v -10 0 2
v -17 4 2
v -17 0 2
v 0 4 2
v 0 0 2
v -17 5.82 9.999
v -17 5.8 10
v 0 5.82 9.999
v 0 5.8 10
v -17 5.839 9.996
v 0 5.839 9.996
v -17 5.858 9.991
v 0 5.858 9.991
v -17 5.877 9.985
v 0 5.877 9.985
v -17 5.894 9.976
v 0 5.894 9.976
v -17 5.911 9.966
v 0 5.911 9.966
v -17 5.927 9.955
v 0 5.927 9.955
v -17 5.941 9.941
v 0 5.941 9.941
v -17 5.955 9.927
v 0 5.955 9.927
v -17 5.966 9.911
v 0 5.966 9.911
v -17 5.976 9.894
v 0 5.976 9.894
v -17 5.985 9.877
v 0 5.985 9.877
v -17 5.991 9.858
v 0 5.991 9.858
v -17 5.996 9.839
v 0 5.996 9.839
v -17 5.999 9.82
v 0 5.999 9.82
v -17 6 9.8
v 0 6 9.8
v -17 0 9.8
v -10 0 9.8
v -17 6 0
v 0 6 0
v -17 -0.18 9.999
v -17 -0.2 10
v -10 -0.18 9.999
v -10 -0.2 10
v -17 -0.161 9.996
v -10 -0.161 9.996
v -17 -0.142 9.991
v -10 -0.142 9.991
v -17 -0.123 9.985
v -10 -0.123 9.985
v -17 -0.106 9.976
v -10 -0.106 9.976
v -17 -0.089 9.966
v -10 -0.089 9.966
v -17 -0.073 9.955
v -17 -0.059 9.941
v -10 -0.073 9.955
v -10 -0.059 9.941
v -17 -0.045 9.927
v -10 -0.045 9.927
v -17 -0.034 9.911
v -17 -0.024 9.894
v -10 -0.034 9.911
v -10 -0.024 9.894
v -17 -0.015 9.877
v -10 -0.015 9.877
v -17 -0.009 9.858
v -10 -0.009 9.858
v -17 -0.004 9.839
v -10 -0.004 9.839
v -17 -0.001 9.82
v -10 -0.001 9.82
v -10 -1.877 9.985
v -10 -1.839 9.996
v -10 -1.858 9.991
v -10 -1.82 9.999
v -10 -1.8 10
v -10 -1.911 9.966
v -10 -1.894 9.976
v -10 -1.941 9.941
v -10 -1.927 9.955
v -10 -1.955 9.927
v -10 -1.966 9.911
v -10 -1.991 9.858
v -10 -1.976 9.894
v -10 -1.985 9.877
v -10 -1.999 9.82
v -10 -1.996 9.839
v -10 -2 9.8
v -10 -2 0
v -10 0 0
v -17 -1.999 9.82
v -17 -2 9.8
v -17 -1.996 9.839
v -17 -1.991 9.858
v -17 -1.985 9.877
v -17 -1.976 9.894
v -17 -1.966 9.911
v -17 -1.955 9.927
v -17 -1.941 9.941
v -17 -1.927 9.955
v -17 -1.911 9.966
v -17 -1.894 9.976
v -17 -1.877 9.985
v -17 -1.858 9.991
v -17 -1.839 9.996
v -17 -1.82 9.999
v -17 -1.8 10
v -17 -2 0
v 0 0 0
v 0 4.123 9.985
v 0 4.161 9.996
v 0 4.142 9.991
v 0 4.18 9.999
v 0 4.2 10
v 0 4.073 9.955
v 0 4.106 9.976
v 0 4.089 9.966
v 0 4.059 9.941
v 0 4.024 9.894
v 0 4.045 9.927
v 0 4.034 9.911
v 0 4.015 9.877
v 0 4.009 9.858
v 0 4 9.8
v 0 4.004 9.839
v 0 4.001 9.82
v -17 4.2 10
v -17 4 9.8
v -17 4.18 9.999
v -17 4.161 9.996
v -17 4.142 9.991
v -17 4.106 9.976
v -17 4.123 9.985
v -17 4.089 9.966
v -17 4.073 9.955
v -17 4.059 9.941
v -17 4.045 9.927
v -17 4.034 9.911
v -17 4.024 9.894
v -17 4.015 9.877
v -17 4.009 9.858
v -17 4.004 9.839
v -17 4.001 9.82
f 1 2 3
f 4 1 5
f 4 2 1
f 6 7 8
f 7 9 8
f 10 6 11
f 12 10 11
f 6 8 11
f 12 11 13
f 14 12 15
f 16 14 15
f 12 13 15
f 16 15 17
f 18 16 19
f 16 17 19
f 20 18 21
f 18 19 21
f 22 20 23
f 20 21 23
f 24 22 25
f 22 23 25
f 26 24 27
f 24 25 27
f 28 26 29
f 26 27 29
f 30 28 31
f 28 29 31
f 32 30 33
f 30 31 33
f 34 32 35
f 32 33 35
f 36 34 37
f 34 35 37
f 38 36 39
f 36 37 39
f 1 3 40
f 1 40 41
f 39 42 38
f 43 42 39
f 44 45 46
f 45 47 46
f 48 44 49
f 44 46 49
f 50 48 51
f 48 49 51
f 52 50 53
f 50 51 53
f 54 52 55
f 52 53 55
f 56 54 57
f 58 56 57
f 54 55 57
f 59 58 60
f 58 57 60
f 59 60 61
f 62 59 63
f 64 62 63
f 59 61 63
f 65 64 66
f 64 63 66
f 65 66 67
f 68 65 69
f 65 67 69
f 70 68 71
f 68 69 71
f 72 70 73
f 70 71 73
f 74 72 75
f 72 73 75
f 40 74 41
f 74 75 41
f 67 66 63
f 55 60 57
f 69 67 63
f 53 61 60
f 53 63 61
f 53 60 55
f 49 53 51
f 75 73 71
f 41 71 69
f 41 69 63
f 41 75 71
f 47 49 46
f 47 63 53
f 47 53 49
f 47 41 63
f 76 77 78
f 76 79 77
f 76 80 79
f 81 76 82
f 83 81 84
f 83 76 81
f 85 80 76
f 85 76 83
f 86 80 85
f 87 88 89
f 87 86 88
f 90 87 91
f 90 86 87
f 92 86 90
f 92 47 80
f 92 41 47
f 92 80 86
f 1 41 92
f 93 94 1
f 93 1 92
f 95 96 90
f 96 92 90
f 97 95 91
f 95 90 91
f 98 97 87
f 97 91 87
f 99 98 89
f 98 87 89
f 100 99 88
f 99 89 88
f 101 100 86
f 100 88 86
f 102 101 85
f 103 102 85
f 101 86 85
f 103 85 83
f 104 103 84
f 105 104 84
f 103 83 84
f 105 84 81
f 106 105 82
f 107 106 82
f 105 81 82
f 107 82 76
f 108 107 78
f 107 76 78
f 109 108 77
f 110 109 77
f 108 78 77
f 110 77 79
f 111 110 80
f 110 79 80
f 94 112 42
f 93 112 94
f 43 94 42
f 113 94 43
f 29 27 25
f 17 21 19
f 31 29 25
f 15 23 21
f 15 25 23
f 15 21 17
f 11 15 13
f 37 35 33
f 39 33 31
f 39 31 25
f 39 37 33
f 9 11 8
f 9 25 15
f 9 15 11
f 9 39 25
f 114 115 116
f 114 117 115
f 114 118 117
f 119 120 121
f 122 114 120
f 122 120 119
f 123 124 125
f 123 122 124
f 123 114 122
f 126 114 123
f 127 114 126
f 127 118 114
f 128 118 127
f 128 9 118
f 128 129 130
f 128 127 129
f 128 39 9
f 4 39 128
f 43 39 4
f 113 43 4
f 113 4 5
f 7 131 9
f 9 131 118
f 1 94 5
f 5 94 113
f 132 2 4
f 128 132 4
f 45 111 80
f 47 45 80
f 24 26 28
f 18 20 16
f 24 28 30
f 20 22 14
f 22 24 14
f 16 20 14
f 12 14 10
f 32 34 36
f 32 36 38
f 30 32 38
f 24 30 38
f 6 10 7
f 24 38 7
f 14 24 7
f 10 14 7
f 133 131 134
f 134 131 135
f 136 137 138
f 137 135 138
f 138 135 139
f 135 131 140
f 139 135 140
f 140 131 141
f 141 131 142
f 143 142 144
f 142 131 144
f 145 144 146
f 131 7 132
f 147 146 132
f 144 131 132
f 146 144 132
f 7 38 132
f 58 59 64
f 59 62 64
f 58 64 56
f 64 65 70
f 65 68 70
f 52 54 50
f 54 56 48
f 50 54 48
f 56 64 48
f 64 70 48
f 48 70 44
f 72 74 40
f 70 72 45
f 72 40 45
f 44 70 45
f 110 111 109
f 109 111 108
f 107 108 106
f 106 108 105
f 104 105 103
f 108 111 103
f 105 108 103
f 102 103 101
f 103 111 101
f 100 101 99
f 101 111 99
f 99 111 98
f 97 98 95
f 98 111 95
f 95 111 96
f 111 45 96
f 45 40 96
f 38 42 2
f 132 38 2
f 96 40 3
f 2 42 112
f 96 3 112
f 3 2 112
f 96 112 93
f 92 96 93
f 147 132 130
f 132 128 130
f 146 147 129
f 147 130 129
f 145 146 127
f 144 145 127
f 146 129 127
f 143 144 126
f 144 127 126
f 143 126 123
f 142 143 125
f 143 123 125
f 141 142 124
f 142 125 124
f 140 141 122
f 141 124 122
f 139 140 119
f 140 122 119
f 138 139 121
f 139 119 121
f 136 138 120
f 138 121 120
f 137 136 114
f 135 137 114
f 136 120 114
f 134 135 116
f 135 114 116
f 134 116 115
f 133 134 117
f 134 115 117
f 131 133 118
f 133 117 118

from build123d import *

# Parameters (mm, degrees)
F0_W     = 17
F0_H     = 4
F1_DEPTH = 2
F2_W     = 17
F2_H     = 2
F2_W_2   = 7
F3_DEPTH = 10
F4_R     = 0.2


with BuildPart() as f1:
    # F0 (on Top) → F1 (new body)
    with BuildSketch(Plane.XY):
        with Locations((-8.5, 2)):
            Rectangle(F0_W, F0_H)
    extrude(amount=F1_DEPTH)

    # F2 (on face) → F3 (join)
    with BuildSketch(Plane(origin=(0, 0, 0), x_dir=(1, 0, 0), z_dir=(0, 0, -1))):
        with Locations((-8.5, -5)):
            Rectangle(F2_W, F2_H)
        with Locations((-13.5, 1)):
            Rectangle(F2_W_2, F2_H)
    extrude(amount=-F3_DEPTH)

    # F4
    f4_edges = [f1.edges().sort_by_distance(p)[0] for p in [
        (-13.5, -2, 10),
        (-13.5, 0, 10),
        (-8.5, 4, 10),
        (-8.5, 6, 10),
    ]]
    fillet(f4_edges, radius=F4_R)


solid = f1.part
